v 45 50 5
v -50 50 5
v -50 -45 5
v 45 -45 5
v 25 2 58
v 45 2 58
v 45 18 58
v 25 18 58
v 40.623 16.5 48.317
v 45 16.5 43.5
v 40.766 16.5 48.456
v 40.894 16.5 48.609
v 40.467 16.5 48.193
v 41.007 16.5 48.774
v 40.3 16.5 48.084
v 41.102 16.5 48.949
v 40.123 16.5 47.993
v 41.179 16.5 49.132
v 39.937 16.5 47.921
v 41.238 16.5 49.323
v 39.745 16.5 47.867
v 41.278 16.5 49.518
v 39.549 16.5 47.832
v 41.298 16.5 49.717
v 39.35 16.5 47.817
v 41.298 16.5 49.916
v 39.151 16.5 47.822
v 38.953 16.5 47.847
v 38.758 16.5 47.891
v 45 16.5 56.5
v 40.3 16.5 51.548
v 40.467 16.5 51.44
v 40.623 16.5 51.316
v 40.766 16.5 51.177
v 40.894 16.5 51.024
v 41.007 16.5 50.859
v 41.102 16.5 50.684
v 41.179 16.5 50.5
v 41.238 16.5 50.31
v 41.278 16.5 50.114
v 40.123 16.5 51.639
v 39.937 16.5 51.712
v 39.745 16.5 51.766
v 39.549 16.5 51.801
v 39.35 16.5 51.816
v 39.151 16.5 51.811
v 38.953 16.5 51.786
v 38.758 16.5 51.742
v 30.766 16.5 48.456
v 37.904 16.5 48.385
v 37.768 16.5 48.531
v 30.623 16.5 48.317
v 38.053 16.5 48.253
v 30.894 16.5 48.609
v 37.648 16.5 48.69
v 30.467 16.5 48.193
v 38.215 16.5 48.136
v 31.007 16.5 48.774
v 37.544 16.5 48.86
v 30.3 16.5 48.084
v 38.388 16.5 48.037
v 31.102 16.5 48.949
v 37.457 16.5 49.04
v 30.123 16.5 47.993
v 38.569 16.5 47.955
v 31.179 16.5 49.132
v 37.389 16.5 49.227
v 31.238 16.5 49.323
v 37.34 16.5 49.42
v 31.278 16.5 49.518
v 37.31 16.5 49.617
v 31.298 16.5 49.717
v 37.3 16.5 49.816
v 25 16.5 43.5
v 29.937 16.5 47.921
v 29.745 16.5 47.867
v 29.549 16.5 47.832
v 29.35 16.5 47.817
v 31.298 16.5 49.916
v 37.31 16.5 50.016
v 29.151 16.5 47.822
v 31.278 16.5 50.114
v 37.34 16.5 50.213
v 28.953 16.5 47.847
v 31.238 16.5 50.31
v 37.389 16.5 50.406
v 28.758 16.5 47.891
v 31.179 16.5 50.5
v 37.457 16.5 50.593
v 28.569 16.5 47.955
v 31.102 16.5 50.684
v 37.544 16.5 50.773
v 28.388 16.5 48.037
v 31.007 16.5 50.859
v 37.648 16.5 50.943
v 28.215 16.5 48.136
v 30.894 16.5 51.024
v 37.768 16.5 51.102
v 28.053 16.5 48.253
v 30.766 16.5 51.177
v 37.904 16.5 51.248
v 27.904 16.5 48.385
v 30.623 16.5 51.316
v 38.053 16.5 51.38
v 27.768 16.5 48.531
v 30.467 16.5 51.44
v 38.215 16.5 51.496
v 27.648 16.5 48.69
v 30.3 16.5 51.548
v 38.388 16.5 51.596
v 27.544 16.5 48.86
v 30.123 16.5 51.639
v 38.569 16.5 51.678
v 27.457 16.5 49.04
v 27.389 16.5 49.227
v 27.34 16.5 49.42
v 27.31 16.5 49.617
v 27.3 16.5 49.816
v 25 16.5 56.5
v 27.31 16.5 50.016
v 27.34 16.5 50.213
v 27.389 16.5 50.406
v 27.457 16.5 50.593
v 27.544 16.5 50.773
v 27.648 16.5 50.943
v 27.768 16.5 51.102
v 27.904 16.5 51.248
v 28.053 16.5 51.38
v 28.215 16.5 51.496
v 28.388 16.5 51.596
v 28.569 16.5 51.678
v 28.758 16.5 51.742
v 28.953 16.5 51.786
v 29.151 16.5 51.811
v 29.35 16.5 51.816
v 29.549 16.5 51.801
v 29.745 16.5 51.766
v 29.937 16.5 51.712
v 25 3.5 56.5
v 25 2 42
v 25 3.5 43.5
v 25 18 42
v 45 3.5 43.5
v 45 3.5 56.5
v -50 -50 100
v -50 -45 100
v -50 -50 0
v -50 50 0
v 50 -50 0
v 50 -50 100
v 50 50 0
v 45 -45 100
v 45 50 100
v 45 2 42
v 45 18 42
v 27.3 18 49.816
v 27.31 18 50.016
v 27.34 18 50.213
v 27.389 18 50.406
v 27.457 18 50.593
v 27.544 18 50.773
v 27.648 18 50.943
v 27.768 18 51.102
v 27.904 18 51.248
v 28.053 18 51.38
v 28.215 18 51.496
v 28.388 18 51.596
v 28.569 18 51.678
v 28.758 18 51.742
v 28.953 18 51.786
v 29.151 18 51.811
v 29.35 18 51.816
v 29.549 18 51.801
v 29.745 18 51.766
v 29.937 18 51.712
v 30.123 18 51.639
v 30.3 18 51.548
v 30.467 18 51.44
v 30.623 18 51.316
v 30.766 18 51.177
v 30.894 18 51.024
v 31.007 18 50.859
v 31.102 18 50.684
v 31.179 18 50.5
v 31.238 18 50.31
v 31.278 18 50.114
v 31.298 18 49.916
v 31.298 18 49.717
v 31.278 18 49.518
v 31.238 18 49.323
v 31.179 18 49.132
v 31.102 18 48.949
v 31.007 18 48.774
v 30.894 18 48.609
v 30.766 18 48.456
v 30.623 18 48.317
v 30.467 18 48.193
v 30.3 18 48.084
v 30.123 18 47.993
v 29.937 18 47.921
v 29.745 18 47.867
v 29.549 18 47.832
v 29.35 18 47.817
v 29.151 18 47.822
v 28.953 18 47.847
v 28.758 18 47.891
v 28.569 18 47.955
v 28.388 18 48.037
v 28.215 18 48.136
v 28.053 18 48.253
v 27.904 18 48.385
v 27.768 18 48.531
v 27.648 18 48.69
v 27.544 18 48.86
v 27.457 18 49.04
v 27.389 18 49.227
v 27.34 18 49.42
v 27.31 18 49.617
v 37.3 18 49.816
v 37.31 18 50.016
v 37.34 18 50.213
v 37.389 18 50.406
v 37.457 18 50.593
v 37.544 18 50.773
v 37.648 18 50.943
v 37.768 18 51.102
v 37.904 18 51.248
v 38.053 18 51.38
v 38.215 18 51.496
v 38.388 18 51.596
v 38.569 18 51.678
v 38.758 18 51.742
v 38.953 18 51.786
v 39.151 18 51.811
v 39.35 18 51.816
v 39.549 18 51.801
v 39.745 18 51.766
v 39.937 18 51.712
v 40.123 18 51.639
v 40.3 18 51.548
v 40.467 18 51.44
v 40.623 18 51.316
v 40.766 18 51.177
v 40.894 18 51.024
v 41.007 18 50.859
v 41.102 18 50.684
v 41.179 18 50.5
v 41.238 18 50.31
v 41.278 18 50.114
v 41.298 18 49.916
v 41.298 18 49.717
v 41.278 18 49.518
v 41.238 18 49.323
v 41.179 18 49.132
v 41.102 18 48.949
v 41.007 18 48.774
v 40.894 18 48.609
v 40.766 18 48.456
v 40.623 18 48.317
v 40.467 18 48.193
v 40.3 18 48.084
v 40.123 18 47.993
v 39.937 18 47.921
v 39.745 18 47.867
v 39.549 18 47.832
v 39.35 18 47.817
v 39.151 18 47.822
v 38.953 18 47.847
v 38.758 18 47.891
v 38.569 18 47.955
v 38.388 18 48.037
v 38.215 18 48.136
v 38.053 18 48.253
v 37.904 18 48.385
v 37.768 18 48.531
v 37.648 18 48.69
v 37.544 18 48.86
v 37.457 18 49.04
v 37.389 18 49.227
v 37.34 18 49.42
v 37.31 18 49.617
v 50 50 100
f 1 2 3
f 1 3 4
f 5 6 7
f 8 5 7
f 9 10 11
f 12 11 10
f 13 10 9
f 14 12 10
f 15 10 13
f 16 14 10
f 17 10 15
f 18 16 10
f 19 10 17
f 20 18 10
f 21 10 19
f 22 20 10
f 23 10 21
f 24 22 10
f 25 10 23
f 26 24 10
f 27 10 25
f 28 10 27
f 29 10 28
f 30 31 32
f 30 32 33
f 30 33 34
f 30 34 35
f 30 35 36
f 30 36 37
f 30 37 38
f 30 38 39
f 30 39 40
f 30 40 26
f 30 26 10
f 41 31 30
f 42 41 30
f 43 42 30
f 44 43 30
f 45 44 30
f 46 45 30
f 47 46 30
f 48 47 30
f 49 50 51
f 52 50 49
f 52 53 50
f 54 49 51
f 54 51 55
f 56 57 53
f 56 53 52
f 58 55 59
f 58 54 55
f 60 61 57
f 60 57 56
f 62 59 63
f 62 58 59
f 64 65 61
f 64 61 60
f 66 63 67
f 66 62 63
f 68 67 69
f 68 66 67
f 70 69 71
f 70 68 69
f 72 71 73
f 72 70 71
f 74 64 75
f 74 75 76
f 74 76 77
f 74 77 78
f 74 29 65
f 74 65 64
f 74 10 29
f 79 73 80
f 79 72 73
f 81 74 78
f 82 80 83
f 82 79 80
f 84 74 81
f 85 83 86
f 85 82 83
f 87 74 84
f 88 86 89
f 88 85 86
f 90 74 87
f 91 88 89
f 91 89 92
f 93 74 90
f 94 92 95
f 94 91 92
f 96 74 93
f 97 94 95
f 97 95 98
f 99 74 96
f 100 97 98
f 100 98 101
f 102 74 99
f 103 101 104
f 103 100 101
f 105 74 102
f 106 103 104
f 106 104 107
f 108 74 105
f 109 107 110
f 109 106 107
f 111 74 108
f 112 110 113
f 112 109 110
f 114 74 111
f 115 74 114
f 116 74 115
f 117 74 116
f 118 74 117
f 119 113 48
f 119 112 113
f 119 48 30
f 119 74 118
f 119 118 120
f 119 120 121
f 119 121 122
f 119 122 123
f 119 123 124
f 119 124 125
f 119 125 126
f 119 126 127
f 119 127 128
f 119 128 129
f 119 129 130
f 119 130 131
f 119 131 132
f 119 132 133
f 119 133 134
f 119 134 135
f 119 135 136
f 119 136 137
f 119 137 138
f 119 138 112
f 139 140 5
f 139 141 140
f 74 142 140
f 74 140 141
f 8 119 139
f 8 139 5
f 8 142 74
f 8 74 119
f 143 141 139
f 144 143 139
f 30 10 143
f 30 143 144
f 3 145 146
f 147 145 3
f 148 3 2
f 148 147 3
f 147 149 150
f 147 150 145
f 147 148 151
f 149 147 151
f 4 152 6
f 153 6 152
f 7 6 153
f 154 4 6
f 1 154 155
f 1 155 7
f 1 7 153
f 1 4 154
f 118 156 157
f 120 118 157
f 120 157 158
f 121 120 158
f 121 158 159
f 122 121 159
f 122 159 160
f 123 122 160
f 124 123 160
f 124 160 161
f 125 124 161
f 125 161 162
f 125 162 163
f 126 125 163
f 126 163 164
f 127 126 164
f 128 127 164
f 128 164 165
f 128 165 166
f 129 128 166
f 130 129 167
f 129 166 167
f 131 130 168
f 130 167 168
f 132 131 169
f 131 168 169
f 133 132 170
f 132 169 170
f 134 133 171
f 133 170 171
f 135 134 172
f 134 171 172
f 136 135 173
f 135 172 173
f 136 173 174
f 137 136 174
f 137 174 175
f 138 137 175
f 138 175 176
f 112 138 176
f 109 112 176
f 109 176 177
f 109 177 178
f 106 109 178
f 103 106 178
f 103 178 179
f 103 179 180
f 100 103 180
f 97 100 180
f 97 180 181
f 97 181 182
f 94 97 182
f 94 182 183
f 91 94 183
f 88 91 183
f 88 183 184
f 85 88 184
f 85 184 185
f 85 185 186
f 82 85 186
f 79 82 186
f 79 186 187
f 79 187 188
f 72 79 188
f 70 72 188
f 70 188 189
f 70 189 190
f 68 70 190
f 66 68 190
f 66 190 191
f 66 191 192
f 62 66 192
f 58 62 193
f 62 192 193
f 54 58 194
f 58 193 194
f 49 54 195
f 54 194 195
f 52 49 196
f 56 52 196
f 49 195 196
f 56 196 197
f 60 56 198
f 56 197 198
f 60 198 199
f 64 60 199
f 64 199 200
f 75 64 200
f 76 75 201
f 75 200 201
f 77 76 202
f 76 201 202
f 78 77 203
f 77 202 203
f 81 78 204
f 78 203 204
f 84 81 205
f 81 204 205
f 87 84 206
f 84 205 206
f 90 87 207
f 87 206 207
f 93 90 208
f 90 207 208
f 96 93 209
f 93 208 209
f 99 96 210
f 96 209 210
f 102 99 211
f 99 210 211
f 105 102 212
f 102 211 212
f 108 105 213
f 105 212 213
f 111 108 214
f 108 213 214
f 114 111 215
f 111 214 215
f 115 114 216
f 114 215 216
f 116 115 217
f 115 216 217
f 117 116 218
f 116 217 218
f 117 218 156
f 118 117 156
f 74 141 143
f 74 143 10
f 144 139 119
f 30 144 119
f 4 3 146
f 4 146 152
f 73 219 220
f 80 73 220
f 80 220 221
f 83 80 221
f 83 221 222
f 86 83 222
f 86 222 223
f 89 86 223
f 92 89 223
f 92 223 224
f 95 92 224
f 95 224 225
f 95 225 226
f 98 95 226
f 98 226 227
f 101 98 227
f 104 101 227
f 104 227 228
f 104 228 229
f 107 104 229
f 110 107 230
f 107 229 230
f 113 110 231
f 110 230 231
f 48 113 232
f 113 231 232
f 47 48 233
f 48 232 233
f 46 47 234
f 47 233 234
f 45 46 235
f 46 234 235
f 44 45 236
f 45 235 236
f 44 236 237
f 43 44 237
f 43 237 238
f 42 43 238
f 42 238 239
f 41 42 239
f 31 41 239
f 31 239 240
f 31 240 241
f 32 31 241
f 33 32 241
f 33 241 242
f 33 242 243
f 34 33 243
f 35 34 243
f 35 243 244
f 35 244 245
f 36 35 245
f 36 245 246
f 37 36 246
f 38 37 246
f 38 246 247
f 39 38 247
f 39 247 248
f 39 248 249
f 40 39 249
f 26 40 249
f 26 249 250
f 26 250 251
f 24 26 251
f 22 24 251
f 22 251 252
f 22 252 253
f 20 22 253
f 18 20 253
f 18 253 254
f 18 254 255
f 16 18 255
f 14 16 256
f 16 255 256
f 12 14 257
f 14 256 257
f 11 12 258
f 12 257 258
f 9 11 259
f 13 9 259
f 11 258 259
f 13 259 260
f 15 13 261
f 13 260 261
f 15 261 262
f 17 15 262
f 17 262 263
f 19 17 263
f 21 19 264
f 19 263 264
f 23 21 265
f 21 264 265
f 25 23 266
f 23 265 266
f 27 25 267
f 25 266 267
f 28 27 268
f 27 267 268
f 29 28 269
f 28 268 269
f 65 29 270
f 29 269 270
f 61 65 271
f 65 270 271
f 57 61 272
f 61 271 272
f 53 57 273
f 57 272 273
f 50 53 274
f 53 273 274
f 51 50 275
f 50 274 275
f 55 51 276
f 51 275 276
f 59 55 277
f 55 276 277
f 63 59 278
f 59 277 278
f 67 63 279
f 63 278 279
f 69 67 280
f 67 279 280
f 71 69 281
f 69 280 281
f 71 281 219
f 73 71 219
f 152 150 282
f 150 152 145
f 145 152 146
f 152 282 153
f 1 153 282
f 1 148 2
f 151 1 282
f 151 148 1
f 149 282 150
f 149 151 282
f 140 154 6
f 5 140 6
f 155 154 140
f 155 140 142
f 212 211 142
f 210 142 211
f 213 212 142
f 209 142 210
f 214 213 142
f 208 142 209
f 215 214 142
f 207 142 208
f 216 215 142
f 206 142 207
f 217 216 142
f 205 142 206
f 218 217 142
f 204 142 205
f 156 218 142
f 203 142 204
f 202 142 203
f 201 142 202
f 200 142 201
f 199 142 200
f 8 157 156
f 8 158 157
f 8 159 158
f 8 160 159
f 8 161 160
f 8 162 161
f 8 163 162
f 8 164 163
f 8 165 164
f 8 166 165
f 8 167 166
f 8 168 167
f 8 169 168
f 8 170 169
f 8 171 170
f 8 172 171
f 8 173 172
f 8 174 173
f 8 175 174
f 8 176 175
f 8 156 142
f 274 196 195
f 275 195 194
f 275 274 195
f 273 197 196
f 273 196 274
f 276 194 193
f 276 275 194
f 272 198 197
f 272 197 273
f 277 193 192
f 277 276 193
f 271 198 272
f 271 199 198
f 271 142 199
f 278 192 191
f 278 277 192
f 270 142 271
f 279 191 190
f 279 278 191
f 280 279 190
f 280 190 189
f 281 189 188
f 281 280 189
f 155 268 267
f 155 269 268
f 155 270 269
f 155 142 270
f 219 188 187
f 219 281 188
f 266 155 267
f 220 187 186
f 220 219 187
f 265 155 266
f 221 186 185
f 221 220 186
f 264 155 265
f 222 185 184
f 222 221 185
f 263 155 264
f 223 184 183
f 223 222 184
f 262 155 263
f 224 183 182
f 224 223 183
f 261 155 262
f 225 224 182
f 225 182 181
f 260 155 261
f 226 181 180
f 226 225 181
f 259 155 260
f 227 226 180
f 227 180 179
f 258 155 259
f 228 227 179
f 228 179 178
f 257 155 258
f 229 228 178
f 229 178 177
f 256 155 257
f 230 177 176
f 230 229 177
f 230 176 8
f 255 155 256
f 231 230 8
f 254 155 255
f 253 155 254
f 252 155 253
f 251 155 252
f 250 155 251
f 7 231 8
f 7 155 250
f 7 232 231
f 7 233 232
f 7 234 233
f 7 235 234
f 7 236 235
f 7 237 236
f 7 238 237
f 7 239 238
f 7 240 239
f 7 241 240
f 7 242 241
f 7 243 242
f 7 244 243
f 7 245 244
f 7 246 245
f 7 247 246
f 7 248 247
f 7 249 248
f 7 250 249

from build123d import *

# Parameters (mm, degrees)
SKETCH1_W           = 100
SKETCH1_H           = 100
BOSS_EXTRUDE1_DEPTH = 5
BOSS_EXTRUDE4_DEPTH = 95
SKETCH5_W           = 16
SKETCH5_H           = 16
BOSS_EXTRUDE6_DEPTH = 20
SKETCH8_W           = 13
SKETCH8_H           = 13
CUT_EXTRUDE2_DEPTH  = 20
SKETCH9_R           = 2
CUT_EXTRUDE3_DEPTH  = 5


with BuildPart() as part:
    # Sketch1 → Boss-Extrude1 (new body)
    with BuildSketch(Plane.XY):
        Rectangle(SKETCH1_W, SKETCH1_H)
    extrude(amount=BOSS_EXTRUDE1_DEPTH)

    # Sketch4 → Boss-Extrude4 (add)
    with BuildSketch(Plane.XY.offset(5)):
        Polygon((50, 50), (50, -50), (-50, -50), (-50, -45), (45, -45), (45, 50), align=None)
    extrude(amount=BOSS_EXTRUDE4_DEPTH)

    # Sketch5 → Boss-Extrude6 (add)
    with BuildSketch(Plane.ZY.offset(-45)):
        with Locations((50, 10)):
            Rectangle(SKETCH5_W, SKETCH5_H)
    extrude(amount=BOSS_EXTRUDE6_DEPTH)

    # Sketch8 → Cut-Extrude2 (cut)
    with BuildSketch(Plane.ZY.offset(-25)):
        with Locations((50, 10)):
            Rectangle(SKETCH8_W, SKETCH8_H)
    extrude(amount=-CUT_EXTRUDE2_DEPTH, mode=Mode.SUBTRACT)

    # Sketch9 → Cut-Extrude3 (cut)
    with BuildSketch(Plane(origin=(0, 18, 0), x_dir=(1, 0, 0), z_dir=(0, 1, 0))):
        with Locations(Location((39.3, -49.816402155, 0), (0, 0, 180))):
            Circle(SKETCH9_R)
        with Locations(Location((29.3, -49.816402155, 0), (0, 0, 180))):
            Circle(SKETCH9_R)
    extrude(amount=-CUT_EXTRUDE3_DEPTH, mode=Mode.SUBTRACT)


solid = part.part
